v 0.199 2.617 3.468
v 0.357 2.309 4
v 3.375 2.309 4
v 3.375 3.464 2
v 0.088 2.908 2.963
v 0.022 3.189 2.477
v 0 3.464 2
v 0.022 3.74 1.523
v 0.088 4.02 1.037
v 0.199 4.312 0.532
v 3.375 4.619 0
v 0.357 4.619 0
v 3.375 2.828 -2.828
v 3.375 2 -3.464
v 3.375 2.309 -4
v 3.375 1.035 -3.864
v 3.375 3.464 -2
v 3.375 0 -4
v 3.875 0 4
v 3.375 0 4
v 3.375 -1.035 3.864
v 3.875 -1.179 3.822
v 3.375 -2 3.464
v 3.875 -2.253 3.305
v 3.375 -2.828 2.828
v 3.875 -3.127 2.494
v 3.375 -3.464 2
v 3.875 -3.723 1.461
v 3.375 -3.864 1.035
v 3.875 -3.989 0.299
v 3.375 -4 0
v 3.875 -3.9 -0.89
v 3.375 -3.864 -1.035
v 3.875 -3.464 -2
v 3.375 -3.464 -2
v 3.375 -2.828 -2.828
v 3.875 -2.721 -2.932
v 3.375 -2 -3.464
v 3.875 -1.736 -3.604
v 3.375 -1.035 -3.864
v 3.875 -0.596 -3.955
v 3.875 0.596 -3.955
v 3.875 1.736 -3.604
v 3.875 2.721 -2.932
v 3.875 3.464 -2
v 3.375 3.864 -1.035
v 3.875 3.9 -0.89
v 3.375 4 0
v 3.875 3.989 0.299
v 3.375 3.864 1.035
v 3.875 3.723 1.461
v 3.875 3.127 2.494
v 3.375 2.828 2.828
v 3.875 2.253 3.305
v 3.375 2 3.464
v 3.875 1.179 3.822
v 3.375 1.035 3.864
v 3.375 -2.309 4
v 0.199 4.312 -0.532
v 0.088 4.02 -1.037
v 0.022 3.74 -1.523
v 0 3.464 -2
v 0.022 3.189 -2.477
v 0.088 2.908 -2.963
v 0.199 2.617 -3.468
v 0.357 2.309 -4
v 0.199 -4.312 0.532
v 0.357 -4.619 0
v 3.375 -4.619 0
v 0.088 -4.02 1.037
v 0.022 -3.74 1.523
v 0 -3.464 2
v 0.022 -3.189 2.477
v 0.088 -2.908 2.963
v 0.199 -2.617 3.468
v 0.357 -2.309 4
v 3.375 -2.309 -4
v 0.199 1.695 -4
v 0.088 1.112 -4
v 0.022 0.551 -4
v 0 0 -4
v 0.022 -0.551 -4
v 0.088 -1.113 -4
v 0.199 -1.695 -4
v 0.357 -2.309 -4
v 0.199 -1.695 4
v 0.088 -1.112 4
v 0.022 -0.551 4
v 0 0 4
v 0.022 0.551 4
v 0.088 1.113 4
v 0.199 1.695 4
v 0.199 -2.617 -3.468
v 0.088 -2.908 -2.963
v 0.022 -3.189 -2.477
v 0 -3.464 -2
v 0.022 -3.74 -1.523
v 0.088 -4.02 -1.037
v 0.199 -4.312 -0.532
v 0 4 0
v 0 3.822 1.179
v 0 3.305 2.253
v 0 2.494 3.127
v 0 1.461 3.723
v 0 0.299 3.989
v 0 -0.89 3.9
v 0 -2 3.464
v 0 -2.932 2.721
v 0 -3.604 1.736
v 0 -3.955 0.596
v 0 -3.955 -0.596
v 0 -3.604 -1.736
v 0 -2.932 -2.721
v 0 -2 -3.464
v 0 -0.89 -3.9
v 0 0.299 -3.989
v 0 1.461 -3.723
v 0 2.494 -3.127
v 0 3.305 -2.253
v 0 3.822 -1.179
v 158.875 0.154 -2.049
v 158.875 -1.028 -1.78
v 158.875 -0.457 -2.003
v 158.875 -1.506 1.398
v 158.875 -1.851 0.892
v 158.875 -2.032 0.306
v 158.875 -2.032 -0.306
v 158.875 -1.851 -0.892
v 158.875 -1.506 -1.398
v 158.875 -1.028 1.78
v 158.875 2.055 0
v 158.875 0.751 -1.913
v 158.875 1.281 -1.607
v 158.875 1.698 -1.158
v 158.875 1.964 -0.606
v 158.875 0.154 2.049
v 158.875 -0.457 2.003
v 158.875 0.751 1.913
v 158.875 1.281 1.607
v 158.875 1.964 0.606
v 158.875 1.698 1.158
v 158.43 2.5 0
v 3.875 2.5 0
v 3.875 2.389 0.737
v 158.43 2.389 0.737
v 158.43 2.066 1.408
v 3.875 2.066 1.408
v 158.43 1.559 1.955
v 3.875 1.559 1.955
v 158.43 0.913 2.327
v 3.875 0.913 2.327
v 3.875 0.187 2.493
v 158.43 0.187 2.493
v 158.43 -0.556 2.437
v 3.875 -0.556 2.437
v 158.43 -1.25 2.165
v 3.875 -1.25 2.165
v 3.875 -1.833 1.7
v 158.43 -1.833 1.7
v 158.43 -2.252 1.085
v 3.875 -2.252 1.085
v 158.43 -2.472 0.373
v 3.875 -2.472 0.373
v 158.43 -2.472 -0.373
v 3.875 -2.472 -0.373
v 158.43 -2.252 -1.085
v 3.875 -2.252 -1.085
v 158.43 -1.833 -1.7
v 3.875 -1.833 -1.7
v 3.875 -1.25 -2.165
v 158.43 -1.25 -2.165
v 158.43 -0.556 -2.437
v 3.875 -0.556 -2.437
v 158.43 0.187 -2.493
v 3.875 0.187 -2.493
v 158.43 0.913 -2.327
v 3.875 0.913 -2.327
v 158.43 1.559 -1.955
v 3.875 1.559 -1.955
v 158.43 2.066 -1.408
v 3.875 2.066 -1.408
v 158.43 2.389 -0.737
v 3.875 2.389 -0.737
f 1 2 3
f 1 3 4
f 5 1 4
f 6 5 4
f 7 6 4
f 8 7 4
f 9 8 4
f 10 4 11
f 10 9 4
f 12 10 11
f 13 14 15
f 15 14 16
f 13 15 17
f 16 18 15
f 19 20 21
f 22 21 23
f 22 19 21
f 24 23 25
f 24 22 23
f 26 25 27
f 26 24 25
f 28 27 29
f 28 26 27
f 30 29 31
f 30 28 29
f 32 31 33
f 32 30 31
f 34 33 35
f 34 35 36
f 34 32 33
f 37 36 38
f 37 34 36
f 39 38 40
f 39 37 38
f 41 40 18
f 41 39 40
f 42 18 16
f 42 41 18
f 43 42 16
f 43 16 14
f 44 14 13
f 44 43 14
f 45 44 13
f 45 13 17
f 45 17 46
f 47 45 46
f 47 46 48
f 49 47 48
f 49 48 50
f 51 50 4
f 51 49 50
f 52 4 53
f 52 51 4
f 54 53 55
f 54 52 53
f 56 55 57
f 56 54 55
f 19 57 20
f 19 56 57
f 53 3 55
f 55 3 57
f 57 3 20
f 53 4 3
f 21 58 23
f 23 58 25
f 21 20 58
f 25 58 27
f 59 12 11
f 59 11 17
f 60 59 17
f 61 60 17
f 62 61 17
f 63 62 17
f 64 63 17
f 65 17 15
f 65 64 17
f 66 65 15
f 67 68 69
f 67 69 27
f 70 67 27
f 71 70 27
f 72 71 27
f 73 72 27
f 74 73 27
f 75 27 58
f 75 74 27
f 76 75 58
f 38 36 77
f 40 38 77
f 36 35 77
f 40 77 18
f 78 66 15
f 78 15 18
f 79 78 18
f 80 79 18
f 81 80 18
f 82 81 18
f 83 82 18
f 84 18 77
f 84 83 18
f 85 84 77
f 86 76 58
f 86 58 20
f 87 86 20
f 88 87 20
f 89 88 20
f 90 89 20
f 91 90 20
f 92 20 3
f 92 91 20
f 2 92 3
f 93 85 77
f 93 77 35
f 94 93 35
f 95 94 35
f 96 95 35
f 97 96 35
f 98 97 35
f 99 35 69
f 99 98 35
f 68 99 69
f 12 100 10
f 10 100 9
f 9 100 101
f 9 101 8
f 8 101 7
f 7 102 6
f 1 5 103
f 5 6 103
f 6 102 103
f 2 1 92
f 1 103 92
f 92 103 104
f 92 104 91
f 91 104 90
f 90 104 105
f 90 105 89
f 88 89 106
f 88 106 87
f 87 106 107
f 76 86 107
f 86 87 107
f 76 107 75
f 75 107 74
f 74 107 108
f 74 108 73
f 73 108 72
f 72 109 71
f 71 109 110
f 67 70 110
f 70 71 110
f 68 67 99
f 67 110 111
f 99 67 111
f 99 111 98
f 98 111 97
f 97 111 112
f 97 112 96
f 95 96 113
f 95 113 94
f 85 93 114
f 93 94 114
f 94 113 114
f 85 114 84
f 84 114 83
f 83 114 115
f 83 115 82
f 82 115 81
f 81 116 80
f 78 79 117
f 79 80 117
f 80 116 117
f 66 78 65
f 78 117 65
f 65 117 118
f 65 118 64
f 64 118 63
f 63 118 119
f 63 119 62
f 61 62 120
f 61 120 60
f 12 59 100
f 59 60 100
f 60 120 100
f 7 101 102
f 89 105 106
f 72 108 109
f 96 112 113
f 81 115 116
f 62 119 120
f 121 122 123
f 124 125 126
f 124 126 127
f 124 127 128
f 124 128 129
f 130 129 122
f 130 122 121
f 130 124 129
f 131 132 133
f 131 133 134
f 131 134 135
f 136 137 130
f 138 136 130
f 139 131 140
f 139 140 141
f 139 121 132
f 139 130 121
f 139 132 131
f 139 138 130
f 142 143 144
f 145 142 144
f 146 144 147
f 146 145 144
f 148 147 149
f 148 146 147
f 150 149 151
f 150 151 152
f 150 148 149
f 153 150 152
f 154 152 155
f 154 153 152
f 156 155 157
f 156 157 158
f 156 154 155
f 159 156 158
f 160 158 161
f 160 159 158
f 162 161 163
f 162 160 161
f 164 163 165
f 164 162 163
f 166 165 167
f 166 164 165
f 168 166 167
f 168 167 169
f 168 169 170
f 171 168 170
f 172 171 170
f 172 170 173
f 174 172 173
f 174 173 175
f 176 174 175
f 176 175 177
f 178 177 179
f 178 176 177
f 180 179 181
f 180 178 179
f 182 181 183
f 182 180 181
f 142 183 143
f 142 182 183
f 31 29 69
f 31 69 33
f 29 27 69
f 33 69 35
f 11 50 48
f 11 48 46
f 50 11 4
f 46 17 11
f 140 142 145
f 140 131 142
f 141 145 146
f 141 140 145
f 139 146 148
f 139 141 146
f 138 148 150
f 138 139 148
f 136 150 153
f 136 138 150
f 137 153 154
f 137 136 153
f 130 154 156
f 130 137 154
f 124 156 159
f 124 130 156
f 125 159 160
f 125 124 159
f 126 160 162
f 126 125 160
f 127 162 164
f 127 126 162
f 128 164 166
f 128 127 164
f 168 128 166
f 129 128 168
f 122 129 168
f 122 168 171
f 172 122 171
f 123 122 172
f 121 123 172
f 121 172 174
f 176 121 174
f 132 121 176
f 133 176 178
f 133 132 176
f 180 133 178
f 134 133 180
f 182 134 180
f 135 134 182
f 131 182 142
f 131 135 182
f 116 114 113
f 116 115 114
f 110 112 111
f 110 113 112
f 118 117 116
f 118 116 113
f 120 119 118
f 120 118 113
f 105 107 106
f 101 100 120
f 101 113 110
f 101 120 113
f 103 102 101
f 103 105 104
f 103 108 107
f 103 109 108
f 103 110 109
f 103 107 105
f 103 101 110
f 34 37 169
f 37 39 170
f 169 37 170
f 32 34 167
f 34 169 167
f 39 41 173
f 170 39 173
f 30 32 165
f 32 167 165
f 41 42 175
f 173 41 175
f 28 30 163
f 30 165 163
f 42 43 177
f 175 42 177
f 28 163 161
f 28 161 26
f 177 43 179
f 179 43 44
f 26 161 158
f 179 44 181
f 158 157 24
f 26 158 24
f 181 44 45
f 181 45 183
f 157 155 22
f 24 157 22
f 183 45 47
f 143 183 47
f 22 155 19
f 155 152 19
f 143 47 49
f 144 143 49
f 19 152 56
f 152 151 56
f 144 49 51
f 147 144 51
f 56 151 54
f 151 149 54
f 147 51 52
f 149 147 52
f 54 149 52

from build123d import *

# Parameters (mm, degrees)
BASEHEAD_DEPTH = 3.875
SKETCH4_W      = 0.5
SKETCH4_H      = 10.618802154


# Read off the part's stored shape, not the designer's step: HeadChamfer
with BuildPart() as part:
    # Sketch1 → BaseHead (new body)
    with BuildSketch(Plane(origin=(0, 0, 0), x_dir=(0, 0, -1), z_dir=(1, 0, 0))):
        Polygon((4, 2.309401077), (4, -2.309401077), (0, -4.618802154), (-4, -2.309401077), (-4, 2.309401077), (0, 4.618802154), align=None)
    extrude(amount=BASEHEAD_DEPTH)

    # HeadChamfer outline → HeadChamfer (revolve, cut)
    with BuildSketch(Plane.YX):
        Polygon((4.618802148, 0.357265587), (3.999999382, -3.57e-07), (4.618802154, -3.57e-07), align=None)
    revolve(axis=Axis((0, 0, 0), (1, 0, 0)), mode=Mode.SUBTRACT)

    # HeadChamfer 2 outline → HeadChamfer 2 (revolve)
    with BuildSketch(Plane.YX):
        Polygon((2.5, 3.875), (2.5, 158.43), (2.055, 158.875), (0, 158.875), (0, 3.875), align=None)
    revolve(axis=Axis((0, 0, 0), (1, 0, 0)))

    # Sketch4 → BearingFace (revolve, cut)
    with BuildSketch(Plane.XY, mode=Mode.PRIVATE) as bearingface_sk:
        with Locations((3.625, 9.309401077)):
            Rectangle(SKETCH4_W, SKETCH4_H)
    revolve(bearingface_sk.sketch.rotate(Axis((0, 0, 0), (1, 0, 0)), 90), axis=Axis((0, 0, 0), (1, 0, 0)), mode=Mode.SUBTRACT)


solid = part.part
